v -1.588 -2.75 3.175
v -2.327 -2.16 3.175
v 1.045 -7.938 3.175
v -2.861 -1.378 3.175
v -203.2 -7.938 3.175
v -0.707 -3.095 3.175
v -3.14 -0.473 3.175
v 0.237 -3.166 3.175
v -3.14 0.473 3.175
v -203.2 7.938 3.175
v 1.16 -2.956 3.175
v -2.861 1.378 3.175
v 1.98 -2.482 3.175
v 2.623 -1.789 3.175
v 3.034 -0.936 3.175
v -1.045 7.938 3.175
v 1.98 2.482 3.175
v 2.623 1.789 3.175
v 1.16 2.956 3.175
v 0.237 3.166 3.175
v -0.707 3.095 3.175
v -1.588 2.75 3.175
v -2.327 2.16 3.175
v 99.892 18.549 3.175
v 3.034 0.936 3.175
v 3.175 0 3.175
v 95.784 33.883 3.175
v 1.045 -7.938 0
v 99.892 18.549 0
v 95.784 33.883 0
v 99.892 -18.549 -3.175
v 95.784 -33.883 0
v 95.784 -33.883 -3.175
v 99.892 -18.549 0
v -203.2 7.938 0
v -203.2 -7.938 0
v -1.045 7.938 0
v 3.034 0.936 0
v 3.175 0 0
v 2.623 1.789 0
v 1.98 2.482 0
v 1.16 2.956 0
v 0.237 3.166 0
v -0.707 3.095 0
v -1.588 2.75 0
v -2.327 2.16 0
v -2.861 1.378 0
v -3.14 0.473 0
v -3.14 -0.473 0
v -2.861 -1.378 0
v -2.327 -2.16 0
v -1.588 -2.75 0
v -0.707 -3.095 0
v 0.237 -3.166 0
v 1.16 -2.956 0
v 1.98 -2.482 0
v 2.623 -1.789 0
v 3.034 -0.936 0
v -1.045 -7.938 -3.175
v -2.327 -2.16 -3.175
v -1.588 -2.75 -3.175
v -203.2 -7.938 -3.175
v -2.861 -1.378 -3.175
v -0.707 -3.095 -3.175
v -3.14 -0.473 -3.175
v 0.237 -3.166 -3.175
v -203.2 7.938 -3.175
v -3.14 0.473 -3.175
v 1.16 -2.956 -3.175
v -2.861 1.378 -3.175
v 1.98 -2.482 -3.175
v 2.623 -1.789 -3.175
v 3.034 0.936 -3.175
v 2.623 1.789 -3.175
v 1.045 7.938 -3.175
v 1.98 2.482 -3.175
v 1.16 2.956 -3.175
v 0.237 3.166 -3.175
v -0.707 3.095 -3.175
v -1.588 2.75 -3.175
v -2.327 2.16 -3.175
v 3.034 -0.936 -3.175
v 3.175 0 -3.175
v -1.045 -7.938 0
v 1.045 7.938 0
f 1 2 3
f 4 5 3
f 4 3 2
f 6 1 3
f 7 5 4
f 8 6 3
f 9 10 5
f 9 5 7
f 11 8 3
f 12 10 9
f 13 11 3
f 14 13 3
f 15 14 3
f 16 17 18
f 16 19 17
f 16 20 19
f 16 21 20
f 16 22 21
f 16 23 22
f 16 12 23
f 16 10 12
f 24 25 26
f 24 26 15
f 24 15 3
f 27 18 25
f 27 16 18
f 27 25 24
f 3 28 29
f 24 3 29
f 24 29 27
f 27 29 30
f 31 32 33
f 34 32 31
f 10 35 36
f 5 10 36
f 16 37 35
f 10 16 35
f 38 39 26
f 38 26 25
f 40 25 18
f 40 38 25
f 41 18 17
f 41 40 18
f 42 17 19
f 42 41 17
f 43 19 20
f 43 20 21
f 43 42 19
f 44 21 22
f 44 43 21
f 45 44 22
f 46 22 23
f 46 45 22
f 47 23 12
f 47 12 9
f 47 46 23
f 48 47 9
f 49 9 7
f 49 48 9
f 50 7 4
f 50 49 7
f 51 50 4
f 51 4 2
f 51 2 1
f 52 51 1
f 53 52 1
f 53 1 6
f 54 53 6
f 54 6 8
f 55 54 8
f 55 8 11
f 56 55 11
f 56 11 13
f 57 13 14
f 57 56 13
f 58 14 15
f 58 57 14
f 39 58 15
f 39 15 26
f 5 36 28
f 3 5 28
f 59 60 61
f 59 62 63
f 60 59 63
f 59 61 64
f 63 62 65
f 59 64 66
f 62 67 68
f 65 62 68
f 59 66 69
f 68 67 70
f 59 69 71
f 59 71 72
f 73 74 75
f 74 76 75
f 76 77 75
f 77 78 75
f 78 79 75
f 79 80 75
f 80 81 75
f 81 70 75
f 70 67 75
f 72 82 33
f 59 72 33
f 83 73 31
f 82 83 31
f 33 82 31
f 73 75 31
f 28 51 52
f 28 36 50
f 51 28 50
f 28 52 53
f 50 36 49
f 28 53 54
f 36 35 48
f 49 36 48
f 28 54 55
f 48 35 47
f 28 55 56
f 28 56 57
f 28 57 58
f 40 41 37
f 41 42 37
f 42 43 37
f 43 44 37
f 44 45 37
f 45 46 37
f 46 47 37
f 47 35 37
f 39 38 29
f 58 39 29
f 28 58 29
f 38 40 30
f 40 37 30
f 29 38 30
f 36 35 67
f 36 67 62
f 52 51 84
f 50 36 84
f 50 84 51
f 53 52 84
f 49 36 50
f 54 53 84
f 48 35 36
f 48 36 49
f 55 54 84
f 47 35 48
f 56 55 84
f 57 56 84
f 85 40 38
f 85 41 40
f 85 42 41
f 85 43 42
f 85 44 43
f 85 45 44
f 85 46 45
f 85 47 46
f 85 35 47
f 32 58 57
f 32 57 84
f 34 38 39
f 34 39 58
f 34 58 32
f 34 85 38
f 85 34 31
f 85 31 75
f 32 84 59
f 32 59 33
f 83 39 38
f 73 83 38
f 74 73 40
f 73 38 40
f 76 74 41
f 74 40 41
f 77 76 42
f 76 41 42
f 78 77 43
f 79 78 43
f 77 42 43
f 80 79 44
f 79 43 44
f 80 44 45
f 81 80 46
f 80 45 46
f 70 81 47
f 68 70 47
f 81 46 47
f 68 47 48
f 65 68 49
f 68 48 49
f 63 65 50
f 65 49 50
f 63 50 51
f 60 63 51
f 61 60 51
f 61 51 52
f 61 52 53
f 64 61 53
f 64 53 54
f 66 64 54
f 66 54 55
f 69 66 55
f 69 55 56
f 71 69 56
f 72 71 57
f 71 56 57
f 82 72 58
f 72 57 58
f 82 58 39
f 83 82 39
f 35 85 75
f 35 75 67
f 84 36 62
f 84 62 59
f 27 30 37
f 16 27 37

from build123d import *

# Parameters (mm, degrees)
F0_R     = 3.175
F1_DEPTH = 3.175
F2_DEPTH = 3.175


with BuildPart() as f1:
    # F0 (on Top) → F1 (new body)
    with BuildSketch(Plane.XY):
        Polygon((-203.2, 7.9375), (-203.2, -7.9375), (-1.0449916996, -7.9375), (1.0449916996, -7.9375), (30.6681449847, 0), (1.0449916996, 7.9375), (-1.0449916996, 7.9375), align=None)
        Circle(F0_R, mode=Mode.SUBTRACT)
        Polygon((95.7837357862, 33.8826793339), (-1.0449916996, 7.9375), (1.0449916996, 7.9375), (30.6681449847, 0), (99.8924881272, 18.5486068416), align=None)
    extrude(amount=F1_DEPTH)


with BuildPart() as f2:
    # F0 (on Top) → F2 (new body)
    with BuildSketch(Plane.XY):
        Polygon((1.0449916996, -7.9375), (-1.0449916996, -7.9375), (95.7837357862, -33.8826793339), (99.8924881272, -18.5486068416), (30.6681449847, 0), align=None)
        Polygon((-203.2, 7.9375), (-203.2, -7.9375), (-1.0449916996, -7.9375), (1.0449916996, -7.9375), (30.6681449847, 0), (1.0449916996, 7.9375), (-1.0449916996, 7.9375), align=None)
        Circle(F0_R, mode=Mode.SUBTRACT)
    extrude(amount=-F2_DEPTH)


solid = Compound([f1.part, f2.part])
